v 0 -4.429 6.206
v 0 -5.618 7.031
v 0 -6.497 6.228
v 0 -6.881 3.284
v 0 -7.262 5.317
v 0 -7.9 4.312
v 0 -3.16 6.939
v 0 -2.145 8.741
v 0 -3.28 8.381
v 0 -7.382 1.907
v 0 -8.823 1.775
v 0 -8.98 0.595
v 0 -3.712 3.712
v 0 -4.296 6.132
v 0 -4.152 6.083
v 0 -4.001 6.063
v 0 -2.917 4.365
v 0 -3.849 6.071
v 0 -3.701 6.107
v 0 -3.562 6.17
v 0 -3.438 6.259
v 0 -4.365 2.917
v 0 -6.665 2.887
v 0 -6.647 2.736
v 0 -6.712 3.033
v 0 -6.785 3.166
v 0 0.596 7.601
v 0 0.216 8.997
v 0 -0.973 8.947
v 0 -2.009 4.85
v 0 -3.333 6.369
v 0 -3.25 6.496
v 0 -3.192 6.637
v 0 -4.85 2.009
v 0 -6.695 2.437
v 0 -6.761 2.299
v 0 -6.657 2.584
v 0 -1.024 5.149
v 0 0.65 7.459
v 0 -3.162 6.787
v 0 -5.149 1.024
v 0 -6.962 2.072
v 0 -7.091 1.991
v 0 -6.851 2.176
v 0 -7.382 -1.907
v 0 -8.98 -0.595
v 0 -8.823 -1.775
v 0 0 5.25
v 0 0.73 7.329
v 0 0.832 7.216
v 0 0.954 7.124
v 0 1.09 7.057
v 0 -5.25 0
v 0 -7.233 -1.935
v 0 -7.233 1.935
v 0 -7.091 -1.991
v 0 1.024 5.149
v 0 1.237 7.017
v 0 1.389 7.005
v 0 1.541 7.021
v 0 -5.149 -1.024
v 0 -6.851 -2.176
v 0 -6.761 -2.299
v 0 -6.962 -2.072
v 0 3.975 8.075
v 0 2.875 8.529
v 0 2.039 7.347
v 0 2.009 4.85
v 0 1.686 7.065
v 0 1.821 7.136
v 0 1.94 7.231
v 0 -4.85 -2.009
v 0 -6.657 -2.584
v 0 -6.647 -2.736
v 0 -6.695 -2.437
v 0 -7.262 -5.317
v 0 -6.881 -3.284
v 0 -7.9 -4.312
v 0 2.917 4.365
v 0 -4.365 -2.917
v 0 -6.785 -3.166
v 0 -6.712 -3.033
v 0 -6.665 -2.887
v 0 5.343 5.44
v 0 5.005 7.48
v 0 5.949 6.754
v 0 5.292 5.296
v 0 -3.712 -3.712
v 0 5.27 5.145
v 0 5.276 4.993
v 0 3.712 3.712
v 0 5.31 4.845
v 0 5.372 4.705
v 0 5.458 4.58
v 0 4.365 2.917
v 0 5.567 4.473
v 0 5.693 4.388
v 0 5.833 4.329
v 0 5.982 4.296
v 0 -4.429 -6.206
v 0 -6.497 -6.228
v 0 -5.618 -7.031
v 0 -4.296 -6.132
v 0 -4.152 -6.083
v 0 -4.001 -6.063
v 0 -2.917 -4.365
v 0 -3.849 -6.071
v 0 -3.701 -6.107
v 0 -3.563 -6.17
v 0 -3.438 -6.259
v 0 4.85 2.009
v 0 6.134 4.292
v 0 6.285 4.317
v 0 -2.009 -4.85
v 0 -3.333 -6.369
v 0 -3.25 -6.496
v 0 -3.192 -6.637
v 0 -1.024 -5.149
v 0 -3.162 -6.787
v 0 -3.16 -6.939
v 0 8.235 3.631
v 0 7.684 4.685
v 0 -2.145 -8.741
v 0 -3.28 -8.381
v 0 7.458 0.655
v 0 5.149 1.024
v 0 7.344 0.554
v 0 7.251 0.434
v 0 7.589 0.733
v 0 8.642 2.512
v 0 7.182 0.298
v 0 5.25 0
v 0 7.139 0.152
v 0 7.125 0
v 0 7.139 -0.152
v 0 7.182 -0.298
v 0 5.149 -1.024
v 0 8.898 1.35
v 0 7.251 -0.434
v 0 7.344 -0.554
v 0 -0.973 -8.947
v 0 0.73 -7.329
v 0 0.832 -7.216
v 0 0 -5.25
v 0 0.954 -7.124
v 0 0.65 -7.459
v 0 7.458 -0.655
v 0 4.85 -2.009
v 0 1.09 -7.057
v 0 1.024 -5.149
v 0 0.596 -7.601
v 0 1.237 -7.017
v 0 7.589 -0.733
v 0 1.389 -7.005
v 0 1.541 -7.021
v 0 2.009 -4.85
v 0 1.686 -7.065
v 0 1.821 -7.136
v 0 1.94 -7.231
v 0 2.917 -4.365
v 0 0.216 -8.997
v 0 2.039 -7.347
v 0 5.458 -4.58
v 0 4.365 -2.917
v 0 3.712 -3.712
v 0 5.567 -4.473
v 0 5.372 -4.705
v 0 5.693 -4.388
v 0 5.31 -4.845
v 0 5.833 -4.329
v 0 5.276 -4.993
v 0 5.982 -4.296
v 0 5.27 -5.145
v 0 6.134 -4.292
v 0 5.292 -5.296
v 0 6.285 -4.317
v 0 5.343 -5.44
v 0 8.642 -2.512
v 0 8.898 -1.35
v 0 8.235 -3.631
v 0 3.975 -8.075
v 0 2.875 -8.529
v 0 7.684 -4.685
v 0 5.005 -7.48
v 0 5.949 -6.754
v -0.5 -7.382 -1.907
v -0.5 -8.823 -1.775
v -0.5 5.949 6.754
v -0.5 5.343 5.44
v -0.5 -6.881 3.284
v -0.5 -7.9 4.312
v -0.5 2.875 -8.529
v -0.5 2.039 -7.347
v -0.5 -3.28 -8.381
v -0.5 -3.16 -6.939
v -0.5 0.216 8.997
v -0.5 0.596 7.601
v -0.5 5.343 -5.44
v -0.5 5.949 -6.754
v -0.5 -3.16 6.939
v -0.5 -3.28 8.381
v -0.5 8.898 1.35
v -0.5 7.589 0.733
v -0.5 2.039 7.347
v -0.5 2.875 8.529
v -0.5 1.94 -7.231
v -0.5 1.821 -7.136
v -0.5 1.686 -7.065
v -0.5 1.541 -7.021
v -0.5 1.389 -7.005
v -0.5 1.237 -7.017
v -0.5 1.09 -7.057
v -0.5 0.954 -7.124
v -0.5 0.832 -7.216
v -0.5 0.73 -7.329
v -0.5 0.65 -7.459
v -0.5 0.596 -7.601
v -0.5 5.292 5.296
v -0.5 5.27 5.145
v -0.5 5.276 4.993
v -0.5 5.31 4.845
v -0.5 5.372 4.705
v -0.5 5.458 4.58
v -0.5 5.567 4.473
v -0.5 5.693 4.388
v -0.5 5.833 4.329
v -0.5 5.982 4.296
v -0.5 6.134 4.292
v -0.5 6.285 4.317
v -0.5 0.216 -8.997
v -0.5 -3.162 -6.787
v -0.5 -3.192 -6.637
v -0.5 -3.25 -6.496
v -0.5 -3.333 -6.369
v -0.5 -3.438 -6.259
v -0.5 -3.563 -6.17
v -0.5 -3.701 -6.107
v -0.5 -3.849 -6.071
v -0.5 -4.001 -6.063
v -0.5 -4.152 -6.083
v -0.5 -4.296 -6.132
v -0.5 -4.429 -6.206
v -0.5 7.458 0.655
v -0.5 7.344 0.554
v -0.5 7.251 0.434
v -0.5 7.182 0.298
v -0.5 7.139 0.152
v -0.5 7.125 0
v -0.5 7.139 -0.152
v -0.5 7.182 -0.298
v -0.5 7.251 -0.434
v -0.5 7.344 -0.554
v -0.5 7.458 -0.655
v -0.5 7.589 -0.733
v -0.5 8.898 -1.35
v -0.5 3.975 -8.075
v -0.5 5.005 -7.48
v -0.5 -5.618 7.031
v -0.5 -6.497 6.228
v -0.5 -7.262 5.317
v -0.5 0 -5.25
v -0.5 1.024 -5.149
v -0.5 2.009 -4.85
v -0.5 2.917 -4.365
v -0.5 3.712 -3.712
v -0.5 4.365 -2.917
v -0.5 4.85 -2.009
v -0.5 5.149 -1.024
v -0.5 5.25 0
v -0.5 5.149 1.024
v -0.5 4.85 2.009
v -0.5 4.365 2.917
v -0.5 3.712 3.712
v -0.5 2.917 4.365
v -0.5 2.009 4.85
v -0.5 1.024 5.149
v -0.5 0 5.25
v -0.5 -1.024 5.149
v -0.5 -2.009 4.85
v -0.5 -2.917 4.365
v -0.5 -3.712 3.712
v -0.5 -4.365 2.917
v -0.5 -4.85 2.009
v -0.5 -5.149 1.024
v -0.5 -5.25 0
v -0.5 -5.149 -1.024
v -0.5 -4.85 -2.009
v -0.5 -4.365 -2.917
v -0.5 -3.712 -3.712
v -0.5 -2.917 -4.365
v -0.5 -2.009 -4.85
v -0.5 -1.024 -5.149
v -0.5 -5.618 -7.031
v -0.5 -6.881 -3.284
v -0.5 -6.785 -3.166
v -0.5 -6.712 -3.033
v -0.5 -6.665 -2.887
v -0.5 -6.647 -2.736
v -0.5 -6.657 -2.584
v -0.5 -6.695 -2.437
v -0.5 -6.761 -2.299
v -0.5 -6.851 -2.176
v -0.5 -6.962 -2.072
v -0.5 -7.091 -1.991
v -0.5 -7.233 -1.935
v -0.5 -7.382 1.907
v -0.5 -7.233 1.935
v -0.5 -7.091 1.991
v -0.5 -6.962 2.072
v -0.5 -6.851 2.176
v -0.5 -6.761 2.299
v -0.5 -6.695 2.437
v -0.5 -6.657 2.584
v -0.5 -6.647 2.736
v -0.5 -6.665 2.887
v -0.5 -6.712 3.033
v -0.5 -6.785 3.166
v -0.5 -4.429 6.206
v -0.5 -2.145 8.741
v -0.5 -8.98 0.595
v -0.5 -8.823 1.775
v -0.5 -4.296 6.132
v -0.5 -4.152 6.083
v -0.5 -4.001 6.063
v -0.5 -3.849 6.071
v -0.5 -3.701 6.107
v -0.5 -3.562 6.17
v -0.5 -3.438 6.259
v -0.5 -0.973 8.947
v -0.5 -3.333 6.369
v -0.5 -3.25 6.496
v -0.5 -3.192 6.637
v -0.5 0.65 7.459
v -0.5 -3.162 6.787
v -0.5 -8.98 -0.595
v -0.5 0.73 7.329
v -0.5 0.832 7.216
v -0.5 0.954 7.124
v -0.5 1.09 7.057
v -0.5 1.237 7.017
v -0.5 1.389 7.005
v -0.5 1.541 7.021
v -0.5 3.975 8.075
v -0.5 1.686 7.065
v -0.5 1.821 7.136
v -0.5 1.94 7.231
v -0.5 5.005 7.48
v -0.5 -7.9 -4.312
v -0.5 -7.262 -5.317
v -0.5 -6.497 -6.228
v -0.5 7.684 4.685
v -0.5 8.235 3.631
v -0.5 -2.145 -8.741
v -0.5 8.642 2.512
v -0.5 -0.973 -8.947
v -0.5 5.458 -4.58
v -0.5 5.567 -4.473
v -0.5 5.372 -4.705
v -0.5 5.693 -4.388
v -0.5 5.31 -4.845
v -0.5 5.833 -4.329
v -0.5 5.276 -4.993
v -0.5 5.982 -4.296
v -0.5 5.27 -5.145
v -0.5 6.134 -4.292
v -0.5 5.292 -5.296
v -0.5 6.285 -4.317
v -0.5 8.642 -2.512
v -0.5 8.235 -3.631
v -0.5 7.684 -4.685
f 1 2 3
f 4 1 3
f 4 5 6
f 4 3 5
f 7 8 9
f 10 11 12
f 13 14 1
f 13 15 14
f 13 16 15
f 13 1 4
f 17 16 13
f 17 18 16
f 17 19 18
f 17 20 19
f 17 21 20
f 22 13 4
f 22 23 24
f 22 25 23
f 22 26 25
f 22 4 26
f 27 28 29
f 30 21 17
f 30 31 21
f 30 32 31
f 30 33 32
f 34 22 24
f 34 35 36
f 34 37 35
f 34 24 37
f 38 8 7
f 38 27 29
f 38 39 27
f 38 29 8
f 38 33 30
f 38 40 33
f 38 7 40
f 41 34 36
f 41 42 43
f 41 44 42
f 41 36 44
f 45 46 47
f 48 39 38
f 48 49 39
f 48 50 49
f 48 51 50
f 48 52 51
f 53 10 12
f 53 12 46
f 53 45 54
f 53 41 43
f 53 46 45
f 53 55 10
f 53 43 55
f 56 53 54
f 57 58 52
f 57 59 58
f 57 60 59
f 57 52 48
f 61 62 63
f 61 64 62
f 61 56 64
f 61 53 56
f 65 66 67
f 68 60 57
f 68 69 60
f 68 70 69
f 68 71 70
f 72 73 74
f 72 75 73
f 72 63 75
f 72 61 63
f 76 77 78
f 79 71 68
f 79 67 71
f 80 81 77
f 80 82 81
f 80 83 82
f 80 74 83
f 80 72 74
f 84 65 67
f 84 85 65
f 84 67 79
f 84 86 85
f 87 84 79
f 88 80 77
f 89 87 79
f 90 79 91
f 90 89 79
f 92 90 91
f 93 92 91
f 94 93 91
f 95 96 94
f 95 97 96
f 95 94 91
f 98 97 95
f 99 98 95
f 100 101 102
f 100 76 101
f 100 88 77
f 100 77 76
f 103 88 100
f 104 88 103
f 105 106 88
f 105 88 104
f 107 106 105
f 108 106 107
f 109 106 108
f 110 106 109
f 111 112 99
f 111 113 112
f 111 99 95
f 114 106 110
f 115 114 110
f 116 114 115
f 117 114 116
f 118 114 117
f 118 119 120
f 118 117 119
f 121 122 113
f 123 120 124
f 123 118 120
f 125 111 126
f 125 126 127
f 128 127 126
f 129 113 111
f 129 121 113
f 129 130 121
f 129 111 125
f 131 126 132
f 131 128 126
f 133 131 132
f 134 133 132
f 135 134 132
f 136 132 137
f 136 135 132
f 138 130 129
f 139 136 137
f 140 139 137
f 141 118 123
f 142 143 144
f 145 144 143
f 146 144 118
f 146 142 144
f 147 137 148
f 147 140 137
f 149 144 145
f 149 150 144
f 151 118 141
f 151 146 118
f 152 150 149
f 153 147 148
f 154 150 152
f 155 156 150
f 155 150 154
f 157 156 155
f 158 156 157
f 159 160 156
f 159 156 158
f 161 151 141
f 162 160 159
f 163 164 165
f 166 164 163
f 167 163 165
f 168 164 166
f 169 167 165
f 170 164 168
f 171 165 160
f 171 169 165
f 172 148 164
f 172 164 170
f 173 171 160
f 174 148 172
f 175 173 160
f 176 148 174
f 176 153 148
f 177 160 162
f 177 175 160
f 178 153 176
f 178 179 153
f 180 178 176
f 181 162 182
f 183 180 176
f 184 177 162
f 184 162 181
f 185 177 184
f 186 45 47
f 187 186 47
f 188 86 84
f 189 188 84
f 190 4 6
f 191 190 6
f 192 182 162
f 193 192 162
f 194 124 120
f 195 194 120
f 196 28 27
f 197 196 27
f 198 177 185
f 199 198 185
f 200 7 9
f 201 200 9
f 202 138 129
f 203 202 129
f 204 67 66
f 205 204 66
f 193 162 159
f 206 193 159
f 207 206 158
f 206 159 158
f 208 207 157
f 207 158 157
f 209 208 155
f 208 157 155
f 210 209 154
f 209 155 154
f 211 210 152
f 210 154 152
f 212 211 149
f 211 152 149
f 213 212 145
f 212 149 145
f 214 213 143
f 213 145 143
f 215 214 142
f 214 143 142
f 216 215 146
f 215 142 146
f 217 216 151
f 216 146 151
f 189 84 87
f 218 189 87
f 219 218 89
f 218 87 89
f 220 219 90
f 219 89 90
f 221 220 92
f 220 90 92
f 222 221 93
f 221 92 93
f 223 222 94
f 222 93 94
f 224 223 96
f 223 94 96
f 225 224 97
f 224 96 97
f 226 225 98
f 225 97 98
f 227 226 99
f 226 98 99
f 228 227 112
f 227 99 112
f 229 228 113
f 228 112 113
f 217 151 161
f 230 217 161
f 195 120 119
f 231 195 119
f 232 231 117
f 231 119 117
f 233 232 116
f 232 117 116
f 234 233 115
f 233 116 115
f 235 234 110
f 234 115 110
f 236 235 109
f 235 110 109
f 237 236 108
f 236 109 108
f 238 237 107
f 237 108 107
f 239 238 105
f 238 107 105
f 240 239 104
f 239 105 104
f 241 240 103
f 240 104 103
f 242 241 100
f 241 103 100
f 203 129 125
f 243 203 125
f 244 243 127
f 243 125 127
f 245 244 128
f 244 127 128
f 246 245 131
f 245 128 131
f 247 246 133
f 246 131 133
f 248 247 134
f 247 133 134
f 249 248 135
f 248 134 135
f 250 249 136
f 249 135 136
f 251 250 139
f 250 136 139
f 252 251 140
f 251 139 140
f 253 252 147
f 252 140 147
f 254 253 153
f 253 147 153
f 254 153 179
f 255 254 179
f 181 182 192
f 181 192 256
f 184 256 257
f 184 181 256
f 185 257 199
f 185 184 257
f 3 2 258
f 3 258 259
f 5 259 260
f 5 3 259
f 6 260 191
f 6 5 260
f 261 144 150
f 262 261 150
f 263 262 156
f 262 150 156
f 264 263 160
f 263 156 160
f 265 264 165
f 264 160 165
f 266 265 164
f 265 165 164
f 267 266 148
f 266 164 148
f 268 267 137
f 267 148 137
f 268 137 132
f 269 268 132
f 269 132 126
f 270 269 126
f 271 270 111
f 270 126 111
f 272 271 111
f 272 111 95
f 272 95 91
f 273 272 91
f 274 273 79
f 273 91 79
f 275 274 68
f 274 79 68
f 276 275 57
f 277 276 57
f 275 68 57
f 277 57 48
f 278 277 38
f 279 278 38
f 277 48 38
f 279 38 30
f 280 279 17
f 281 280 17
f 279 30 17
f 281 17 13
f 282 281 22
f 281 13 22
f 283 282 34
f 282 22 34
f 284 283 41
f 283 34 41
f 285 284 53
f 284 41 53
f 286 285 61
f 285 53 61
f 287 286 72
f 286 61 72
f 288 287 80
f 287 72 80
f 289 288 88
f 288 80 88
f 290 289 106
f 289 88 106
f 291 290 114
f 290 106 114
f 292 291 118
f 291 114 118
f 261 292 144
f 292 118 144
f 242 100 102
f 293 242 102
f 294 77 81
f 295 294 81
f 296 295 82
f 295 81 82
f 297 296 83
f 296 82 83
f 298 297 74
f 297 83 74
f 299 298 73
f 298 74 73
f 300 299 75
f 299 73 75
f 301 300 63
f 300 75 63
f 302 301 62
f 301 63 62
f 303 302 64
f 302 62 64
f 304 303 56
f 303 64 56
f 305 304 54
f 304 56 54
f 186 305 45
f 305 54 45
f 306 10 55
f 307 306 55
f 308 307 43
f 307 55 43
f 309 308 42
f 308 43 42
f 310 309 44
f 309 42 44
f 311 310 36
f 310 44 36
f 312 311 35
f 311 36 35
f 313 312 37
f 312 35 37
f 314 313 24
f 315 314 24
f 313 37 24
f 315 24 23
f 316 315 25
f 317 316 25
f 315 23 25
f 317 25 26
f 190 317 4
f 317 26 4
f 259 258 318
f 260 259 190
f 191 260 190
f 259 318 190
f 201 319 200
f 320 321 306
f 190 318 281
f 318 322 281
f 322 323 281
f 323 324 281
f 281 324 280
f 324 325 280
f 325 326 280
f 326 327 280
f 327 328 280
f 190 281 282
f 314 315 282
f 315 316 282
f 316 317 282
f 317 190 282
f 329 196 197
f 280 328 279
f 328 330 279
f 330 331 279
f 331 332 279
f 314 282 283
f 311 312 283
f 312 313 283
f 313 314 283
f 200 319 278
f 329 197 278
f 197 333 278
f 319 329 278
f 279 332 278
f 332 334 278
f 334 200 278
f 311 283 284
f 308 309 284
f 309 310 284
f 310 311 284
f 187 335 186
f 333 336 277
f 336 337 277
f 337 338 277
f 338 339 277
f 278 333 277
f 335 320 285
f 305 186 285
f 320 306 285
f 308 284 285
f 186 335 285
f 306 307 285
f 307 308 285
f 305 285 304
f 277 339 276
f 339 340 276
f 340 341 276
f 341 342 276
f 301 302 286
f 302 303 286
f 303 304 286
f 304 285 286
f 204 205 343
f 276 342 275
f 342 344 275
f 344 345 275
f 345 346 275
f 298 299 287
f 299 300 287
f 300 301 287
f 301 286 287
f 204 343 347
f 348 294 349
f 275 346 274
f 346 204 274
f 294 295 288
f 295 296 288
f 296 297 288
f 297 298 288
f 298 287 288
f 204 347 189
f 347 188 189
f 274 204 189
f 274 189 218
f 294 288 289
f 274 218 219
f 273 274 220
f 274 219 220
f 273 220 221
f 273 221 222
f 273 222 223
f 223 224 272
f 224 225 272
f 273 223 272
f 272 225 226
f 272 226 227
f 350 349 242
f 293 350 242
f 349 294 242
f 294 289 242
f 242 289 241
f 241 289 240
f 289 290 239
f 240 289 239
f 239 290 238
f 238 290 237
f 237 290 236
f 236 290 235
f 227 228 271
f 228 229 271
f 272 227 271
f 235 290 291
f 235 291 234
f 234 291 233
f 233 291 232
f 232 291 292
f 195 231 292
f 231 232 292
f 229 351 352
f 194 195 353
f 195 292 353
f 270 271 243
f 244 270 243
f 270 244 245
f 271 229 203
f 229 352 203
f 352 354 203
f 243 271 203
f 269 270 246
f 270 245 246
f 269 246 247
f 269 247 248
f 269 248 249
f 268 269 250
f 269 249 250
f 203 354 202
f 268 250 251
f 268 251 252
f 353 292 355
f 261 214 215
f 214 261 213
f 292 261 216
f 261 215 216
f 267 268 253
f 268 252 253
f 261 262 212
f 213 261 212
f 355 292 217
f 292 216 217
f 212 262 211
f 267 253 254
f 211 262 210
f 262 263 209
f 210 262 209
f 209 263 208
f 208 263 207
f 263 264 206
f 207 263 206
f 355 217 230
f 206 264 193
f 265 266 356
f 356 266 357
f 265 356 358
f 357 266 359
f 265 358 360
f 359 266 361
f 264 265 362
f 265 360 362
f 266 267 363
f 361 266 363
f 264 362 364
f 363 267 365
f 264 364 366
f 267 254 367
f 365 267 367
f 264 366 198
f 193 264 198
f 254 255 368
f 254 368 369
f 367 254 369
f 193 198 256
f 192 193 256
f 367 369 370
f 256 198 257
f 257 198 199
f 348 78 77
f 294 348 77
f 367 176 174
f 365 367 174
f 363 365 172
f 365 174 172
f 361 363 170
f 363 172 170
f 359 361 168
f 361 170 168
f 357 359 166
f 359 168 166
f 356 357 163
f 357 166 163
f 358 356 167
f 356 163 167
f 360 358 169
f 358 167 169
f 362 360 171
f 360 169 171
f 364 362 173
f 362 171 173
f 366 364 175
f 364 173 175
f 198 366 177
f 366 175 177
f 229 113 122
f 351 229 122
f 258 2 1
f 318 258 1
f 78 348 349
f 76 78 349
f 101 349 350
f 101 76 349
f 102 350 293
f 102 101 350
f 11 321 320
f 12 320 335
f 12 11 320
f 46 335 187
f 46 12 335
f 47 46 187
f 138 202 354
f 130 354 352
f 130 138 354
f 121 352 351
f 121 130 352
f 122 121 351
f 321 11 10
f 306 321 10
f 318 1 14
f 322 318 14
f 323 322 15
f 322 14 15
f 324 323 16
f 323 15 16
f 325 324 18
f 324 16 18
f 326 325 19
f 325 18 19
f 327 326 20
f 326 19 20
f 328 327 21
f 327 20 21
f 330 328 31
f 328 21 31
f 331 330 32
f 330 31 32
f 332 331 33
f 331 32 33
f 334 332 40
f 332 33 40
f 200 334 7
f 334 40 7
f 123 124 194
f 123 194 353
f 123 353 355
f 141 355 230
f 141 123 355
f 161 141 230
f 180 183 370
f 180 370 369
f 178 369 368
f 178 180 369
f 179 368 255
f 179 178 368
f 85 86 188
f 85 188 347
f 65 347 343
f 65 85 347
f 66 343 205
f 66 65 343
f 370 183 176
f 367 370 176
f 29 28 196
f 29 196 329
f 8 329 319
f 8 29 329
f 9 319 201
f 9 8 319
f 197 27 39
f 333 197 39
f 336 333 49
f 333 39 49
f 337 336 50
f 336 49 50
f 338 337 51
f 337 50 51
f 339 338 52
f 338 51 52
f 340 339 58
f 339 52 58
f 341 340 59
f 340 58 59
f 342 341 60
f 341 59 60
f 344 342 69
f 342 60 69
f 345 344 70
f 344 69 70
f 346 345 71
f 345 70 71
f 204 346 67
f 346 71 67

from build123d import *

# Parameters (mm, degrees)
SKETCH1_R          = 9
SKETCH1_R_2        = 5.25
BASE_EXTRUDE_DEPTH = 0.5
TYPEASLOT_DEPTH    = 13.737739203
TYPEAPATTERN_COUNT = 9


with BuildPart() as part:
    # Sketch1 → Base-Extrude (new body)
    with BuildSketch(Plane(origin=(0, 0, 0), x_dir=(0, 0, -1), z_dir=(1, 0, 0))):
        Circle(SKETCH1_R)
        Circle(SKETCH1_R_2, mode=Mode.SUBTRACT)
    extrude(amount=-BASE_EXTRUDE_DEPTH)

    # Sketch3 → TypeASlot (cut, through all)
    with BuildSketch(Plane(origin=(0, 0, 0), x_dir=(0, 0, -1), z_dir=(1, 0, 0))):
        with BuildLine():
            Line((0.732571764, 7.589401083), (1.35, 8.89817397))
            Line((1.35, 8.89817397), (1.35, 9.70817397))
            Line((1.35, 9.70817397), (-1.35, 9.70817397))
            Line((-1.35, 9.70817397), (-1.35, 8.89817397))
            Line((-1.35, 8.89817397), (-0.732571764, 7.589401083))
            ThreePointArc((-0.732571764, 7.589401083), (0, 7.125), (0.732571764, 7.589401083))
        make_face()
    typeaslot = extrude(amount=-TYPEASLOT_DEPTH, mode=Mode.SUBTRACT)

    # TypeAPattern: TypeASlot ×9 about axis
    typeapattern_axis = Axis((0, 0, 0), (1, 0, 0))
    for i in range(1, TYPEAPATTERN_COUNT):
        add(typeaslot.rotate(typeapattern_axis, i * 360 / TYPEAPATTERN_COUNT), mode=Mode.SUBTRACT)


solid = part.part
